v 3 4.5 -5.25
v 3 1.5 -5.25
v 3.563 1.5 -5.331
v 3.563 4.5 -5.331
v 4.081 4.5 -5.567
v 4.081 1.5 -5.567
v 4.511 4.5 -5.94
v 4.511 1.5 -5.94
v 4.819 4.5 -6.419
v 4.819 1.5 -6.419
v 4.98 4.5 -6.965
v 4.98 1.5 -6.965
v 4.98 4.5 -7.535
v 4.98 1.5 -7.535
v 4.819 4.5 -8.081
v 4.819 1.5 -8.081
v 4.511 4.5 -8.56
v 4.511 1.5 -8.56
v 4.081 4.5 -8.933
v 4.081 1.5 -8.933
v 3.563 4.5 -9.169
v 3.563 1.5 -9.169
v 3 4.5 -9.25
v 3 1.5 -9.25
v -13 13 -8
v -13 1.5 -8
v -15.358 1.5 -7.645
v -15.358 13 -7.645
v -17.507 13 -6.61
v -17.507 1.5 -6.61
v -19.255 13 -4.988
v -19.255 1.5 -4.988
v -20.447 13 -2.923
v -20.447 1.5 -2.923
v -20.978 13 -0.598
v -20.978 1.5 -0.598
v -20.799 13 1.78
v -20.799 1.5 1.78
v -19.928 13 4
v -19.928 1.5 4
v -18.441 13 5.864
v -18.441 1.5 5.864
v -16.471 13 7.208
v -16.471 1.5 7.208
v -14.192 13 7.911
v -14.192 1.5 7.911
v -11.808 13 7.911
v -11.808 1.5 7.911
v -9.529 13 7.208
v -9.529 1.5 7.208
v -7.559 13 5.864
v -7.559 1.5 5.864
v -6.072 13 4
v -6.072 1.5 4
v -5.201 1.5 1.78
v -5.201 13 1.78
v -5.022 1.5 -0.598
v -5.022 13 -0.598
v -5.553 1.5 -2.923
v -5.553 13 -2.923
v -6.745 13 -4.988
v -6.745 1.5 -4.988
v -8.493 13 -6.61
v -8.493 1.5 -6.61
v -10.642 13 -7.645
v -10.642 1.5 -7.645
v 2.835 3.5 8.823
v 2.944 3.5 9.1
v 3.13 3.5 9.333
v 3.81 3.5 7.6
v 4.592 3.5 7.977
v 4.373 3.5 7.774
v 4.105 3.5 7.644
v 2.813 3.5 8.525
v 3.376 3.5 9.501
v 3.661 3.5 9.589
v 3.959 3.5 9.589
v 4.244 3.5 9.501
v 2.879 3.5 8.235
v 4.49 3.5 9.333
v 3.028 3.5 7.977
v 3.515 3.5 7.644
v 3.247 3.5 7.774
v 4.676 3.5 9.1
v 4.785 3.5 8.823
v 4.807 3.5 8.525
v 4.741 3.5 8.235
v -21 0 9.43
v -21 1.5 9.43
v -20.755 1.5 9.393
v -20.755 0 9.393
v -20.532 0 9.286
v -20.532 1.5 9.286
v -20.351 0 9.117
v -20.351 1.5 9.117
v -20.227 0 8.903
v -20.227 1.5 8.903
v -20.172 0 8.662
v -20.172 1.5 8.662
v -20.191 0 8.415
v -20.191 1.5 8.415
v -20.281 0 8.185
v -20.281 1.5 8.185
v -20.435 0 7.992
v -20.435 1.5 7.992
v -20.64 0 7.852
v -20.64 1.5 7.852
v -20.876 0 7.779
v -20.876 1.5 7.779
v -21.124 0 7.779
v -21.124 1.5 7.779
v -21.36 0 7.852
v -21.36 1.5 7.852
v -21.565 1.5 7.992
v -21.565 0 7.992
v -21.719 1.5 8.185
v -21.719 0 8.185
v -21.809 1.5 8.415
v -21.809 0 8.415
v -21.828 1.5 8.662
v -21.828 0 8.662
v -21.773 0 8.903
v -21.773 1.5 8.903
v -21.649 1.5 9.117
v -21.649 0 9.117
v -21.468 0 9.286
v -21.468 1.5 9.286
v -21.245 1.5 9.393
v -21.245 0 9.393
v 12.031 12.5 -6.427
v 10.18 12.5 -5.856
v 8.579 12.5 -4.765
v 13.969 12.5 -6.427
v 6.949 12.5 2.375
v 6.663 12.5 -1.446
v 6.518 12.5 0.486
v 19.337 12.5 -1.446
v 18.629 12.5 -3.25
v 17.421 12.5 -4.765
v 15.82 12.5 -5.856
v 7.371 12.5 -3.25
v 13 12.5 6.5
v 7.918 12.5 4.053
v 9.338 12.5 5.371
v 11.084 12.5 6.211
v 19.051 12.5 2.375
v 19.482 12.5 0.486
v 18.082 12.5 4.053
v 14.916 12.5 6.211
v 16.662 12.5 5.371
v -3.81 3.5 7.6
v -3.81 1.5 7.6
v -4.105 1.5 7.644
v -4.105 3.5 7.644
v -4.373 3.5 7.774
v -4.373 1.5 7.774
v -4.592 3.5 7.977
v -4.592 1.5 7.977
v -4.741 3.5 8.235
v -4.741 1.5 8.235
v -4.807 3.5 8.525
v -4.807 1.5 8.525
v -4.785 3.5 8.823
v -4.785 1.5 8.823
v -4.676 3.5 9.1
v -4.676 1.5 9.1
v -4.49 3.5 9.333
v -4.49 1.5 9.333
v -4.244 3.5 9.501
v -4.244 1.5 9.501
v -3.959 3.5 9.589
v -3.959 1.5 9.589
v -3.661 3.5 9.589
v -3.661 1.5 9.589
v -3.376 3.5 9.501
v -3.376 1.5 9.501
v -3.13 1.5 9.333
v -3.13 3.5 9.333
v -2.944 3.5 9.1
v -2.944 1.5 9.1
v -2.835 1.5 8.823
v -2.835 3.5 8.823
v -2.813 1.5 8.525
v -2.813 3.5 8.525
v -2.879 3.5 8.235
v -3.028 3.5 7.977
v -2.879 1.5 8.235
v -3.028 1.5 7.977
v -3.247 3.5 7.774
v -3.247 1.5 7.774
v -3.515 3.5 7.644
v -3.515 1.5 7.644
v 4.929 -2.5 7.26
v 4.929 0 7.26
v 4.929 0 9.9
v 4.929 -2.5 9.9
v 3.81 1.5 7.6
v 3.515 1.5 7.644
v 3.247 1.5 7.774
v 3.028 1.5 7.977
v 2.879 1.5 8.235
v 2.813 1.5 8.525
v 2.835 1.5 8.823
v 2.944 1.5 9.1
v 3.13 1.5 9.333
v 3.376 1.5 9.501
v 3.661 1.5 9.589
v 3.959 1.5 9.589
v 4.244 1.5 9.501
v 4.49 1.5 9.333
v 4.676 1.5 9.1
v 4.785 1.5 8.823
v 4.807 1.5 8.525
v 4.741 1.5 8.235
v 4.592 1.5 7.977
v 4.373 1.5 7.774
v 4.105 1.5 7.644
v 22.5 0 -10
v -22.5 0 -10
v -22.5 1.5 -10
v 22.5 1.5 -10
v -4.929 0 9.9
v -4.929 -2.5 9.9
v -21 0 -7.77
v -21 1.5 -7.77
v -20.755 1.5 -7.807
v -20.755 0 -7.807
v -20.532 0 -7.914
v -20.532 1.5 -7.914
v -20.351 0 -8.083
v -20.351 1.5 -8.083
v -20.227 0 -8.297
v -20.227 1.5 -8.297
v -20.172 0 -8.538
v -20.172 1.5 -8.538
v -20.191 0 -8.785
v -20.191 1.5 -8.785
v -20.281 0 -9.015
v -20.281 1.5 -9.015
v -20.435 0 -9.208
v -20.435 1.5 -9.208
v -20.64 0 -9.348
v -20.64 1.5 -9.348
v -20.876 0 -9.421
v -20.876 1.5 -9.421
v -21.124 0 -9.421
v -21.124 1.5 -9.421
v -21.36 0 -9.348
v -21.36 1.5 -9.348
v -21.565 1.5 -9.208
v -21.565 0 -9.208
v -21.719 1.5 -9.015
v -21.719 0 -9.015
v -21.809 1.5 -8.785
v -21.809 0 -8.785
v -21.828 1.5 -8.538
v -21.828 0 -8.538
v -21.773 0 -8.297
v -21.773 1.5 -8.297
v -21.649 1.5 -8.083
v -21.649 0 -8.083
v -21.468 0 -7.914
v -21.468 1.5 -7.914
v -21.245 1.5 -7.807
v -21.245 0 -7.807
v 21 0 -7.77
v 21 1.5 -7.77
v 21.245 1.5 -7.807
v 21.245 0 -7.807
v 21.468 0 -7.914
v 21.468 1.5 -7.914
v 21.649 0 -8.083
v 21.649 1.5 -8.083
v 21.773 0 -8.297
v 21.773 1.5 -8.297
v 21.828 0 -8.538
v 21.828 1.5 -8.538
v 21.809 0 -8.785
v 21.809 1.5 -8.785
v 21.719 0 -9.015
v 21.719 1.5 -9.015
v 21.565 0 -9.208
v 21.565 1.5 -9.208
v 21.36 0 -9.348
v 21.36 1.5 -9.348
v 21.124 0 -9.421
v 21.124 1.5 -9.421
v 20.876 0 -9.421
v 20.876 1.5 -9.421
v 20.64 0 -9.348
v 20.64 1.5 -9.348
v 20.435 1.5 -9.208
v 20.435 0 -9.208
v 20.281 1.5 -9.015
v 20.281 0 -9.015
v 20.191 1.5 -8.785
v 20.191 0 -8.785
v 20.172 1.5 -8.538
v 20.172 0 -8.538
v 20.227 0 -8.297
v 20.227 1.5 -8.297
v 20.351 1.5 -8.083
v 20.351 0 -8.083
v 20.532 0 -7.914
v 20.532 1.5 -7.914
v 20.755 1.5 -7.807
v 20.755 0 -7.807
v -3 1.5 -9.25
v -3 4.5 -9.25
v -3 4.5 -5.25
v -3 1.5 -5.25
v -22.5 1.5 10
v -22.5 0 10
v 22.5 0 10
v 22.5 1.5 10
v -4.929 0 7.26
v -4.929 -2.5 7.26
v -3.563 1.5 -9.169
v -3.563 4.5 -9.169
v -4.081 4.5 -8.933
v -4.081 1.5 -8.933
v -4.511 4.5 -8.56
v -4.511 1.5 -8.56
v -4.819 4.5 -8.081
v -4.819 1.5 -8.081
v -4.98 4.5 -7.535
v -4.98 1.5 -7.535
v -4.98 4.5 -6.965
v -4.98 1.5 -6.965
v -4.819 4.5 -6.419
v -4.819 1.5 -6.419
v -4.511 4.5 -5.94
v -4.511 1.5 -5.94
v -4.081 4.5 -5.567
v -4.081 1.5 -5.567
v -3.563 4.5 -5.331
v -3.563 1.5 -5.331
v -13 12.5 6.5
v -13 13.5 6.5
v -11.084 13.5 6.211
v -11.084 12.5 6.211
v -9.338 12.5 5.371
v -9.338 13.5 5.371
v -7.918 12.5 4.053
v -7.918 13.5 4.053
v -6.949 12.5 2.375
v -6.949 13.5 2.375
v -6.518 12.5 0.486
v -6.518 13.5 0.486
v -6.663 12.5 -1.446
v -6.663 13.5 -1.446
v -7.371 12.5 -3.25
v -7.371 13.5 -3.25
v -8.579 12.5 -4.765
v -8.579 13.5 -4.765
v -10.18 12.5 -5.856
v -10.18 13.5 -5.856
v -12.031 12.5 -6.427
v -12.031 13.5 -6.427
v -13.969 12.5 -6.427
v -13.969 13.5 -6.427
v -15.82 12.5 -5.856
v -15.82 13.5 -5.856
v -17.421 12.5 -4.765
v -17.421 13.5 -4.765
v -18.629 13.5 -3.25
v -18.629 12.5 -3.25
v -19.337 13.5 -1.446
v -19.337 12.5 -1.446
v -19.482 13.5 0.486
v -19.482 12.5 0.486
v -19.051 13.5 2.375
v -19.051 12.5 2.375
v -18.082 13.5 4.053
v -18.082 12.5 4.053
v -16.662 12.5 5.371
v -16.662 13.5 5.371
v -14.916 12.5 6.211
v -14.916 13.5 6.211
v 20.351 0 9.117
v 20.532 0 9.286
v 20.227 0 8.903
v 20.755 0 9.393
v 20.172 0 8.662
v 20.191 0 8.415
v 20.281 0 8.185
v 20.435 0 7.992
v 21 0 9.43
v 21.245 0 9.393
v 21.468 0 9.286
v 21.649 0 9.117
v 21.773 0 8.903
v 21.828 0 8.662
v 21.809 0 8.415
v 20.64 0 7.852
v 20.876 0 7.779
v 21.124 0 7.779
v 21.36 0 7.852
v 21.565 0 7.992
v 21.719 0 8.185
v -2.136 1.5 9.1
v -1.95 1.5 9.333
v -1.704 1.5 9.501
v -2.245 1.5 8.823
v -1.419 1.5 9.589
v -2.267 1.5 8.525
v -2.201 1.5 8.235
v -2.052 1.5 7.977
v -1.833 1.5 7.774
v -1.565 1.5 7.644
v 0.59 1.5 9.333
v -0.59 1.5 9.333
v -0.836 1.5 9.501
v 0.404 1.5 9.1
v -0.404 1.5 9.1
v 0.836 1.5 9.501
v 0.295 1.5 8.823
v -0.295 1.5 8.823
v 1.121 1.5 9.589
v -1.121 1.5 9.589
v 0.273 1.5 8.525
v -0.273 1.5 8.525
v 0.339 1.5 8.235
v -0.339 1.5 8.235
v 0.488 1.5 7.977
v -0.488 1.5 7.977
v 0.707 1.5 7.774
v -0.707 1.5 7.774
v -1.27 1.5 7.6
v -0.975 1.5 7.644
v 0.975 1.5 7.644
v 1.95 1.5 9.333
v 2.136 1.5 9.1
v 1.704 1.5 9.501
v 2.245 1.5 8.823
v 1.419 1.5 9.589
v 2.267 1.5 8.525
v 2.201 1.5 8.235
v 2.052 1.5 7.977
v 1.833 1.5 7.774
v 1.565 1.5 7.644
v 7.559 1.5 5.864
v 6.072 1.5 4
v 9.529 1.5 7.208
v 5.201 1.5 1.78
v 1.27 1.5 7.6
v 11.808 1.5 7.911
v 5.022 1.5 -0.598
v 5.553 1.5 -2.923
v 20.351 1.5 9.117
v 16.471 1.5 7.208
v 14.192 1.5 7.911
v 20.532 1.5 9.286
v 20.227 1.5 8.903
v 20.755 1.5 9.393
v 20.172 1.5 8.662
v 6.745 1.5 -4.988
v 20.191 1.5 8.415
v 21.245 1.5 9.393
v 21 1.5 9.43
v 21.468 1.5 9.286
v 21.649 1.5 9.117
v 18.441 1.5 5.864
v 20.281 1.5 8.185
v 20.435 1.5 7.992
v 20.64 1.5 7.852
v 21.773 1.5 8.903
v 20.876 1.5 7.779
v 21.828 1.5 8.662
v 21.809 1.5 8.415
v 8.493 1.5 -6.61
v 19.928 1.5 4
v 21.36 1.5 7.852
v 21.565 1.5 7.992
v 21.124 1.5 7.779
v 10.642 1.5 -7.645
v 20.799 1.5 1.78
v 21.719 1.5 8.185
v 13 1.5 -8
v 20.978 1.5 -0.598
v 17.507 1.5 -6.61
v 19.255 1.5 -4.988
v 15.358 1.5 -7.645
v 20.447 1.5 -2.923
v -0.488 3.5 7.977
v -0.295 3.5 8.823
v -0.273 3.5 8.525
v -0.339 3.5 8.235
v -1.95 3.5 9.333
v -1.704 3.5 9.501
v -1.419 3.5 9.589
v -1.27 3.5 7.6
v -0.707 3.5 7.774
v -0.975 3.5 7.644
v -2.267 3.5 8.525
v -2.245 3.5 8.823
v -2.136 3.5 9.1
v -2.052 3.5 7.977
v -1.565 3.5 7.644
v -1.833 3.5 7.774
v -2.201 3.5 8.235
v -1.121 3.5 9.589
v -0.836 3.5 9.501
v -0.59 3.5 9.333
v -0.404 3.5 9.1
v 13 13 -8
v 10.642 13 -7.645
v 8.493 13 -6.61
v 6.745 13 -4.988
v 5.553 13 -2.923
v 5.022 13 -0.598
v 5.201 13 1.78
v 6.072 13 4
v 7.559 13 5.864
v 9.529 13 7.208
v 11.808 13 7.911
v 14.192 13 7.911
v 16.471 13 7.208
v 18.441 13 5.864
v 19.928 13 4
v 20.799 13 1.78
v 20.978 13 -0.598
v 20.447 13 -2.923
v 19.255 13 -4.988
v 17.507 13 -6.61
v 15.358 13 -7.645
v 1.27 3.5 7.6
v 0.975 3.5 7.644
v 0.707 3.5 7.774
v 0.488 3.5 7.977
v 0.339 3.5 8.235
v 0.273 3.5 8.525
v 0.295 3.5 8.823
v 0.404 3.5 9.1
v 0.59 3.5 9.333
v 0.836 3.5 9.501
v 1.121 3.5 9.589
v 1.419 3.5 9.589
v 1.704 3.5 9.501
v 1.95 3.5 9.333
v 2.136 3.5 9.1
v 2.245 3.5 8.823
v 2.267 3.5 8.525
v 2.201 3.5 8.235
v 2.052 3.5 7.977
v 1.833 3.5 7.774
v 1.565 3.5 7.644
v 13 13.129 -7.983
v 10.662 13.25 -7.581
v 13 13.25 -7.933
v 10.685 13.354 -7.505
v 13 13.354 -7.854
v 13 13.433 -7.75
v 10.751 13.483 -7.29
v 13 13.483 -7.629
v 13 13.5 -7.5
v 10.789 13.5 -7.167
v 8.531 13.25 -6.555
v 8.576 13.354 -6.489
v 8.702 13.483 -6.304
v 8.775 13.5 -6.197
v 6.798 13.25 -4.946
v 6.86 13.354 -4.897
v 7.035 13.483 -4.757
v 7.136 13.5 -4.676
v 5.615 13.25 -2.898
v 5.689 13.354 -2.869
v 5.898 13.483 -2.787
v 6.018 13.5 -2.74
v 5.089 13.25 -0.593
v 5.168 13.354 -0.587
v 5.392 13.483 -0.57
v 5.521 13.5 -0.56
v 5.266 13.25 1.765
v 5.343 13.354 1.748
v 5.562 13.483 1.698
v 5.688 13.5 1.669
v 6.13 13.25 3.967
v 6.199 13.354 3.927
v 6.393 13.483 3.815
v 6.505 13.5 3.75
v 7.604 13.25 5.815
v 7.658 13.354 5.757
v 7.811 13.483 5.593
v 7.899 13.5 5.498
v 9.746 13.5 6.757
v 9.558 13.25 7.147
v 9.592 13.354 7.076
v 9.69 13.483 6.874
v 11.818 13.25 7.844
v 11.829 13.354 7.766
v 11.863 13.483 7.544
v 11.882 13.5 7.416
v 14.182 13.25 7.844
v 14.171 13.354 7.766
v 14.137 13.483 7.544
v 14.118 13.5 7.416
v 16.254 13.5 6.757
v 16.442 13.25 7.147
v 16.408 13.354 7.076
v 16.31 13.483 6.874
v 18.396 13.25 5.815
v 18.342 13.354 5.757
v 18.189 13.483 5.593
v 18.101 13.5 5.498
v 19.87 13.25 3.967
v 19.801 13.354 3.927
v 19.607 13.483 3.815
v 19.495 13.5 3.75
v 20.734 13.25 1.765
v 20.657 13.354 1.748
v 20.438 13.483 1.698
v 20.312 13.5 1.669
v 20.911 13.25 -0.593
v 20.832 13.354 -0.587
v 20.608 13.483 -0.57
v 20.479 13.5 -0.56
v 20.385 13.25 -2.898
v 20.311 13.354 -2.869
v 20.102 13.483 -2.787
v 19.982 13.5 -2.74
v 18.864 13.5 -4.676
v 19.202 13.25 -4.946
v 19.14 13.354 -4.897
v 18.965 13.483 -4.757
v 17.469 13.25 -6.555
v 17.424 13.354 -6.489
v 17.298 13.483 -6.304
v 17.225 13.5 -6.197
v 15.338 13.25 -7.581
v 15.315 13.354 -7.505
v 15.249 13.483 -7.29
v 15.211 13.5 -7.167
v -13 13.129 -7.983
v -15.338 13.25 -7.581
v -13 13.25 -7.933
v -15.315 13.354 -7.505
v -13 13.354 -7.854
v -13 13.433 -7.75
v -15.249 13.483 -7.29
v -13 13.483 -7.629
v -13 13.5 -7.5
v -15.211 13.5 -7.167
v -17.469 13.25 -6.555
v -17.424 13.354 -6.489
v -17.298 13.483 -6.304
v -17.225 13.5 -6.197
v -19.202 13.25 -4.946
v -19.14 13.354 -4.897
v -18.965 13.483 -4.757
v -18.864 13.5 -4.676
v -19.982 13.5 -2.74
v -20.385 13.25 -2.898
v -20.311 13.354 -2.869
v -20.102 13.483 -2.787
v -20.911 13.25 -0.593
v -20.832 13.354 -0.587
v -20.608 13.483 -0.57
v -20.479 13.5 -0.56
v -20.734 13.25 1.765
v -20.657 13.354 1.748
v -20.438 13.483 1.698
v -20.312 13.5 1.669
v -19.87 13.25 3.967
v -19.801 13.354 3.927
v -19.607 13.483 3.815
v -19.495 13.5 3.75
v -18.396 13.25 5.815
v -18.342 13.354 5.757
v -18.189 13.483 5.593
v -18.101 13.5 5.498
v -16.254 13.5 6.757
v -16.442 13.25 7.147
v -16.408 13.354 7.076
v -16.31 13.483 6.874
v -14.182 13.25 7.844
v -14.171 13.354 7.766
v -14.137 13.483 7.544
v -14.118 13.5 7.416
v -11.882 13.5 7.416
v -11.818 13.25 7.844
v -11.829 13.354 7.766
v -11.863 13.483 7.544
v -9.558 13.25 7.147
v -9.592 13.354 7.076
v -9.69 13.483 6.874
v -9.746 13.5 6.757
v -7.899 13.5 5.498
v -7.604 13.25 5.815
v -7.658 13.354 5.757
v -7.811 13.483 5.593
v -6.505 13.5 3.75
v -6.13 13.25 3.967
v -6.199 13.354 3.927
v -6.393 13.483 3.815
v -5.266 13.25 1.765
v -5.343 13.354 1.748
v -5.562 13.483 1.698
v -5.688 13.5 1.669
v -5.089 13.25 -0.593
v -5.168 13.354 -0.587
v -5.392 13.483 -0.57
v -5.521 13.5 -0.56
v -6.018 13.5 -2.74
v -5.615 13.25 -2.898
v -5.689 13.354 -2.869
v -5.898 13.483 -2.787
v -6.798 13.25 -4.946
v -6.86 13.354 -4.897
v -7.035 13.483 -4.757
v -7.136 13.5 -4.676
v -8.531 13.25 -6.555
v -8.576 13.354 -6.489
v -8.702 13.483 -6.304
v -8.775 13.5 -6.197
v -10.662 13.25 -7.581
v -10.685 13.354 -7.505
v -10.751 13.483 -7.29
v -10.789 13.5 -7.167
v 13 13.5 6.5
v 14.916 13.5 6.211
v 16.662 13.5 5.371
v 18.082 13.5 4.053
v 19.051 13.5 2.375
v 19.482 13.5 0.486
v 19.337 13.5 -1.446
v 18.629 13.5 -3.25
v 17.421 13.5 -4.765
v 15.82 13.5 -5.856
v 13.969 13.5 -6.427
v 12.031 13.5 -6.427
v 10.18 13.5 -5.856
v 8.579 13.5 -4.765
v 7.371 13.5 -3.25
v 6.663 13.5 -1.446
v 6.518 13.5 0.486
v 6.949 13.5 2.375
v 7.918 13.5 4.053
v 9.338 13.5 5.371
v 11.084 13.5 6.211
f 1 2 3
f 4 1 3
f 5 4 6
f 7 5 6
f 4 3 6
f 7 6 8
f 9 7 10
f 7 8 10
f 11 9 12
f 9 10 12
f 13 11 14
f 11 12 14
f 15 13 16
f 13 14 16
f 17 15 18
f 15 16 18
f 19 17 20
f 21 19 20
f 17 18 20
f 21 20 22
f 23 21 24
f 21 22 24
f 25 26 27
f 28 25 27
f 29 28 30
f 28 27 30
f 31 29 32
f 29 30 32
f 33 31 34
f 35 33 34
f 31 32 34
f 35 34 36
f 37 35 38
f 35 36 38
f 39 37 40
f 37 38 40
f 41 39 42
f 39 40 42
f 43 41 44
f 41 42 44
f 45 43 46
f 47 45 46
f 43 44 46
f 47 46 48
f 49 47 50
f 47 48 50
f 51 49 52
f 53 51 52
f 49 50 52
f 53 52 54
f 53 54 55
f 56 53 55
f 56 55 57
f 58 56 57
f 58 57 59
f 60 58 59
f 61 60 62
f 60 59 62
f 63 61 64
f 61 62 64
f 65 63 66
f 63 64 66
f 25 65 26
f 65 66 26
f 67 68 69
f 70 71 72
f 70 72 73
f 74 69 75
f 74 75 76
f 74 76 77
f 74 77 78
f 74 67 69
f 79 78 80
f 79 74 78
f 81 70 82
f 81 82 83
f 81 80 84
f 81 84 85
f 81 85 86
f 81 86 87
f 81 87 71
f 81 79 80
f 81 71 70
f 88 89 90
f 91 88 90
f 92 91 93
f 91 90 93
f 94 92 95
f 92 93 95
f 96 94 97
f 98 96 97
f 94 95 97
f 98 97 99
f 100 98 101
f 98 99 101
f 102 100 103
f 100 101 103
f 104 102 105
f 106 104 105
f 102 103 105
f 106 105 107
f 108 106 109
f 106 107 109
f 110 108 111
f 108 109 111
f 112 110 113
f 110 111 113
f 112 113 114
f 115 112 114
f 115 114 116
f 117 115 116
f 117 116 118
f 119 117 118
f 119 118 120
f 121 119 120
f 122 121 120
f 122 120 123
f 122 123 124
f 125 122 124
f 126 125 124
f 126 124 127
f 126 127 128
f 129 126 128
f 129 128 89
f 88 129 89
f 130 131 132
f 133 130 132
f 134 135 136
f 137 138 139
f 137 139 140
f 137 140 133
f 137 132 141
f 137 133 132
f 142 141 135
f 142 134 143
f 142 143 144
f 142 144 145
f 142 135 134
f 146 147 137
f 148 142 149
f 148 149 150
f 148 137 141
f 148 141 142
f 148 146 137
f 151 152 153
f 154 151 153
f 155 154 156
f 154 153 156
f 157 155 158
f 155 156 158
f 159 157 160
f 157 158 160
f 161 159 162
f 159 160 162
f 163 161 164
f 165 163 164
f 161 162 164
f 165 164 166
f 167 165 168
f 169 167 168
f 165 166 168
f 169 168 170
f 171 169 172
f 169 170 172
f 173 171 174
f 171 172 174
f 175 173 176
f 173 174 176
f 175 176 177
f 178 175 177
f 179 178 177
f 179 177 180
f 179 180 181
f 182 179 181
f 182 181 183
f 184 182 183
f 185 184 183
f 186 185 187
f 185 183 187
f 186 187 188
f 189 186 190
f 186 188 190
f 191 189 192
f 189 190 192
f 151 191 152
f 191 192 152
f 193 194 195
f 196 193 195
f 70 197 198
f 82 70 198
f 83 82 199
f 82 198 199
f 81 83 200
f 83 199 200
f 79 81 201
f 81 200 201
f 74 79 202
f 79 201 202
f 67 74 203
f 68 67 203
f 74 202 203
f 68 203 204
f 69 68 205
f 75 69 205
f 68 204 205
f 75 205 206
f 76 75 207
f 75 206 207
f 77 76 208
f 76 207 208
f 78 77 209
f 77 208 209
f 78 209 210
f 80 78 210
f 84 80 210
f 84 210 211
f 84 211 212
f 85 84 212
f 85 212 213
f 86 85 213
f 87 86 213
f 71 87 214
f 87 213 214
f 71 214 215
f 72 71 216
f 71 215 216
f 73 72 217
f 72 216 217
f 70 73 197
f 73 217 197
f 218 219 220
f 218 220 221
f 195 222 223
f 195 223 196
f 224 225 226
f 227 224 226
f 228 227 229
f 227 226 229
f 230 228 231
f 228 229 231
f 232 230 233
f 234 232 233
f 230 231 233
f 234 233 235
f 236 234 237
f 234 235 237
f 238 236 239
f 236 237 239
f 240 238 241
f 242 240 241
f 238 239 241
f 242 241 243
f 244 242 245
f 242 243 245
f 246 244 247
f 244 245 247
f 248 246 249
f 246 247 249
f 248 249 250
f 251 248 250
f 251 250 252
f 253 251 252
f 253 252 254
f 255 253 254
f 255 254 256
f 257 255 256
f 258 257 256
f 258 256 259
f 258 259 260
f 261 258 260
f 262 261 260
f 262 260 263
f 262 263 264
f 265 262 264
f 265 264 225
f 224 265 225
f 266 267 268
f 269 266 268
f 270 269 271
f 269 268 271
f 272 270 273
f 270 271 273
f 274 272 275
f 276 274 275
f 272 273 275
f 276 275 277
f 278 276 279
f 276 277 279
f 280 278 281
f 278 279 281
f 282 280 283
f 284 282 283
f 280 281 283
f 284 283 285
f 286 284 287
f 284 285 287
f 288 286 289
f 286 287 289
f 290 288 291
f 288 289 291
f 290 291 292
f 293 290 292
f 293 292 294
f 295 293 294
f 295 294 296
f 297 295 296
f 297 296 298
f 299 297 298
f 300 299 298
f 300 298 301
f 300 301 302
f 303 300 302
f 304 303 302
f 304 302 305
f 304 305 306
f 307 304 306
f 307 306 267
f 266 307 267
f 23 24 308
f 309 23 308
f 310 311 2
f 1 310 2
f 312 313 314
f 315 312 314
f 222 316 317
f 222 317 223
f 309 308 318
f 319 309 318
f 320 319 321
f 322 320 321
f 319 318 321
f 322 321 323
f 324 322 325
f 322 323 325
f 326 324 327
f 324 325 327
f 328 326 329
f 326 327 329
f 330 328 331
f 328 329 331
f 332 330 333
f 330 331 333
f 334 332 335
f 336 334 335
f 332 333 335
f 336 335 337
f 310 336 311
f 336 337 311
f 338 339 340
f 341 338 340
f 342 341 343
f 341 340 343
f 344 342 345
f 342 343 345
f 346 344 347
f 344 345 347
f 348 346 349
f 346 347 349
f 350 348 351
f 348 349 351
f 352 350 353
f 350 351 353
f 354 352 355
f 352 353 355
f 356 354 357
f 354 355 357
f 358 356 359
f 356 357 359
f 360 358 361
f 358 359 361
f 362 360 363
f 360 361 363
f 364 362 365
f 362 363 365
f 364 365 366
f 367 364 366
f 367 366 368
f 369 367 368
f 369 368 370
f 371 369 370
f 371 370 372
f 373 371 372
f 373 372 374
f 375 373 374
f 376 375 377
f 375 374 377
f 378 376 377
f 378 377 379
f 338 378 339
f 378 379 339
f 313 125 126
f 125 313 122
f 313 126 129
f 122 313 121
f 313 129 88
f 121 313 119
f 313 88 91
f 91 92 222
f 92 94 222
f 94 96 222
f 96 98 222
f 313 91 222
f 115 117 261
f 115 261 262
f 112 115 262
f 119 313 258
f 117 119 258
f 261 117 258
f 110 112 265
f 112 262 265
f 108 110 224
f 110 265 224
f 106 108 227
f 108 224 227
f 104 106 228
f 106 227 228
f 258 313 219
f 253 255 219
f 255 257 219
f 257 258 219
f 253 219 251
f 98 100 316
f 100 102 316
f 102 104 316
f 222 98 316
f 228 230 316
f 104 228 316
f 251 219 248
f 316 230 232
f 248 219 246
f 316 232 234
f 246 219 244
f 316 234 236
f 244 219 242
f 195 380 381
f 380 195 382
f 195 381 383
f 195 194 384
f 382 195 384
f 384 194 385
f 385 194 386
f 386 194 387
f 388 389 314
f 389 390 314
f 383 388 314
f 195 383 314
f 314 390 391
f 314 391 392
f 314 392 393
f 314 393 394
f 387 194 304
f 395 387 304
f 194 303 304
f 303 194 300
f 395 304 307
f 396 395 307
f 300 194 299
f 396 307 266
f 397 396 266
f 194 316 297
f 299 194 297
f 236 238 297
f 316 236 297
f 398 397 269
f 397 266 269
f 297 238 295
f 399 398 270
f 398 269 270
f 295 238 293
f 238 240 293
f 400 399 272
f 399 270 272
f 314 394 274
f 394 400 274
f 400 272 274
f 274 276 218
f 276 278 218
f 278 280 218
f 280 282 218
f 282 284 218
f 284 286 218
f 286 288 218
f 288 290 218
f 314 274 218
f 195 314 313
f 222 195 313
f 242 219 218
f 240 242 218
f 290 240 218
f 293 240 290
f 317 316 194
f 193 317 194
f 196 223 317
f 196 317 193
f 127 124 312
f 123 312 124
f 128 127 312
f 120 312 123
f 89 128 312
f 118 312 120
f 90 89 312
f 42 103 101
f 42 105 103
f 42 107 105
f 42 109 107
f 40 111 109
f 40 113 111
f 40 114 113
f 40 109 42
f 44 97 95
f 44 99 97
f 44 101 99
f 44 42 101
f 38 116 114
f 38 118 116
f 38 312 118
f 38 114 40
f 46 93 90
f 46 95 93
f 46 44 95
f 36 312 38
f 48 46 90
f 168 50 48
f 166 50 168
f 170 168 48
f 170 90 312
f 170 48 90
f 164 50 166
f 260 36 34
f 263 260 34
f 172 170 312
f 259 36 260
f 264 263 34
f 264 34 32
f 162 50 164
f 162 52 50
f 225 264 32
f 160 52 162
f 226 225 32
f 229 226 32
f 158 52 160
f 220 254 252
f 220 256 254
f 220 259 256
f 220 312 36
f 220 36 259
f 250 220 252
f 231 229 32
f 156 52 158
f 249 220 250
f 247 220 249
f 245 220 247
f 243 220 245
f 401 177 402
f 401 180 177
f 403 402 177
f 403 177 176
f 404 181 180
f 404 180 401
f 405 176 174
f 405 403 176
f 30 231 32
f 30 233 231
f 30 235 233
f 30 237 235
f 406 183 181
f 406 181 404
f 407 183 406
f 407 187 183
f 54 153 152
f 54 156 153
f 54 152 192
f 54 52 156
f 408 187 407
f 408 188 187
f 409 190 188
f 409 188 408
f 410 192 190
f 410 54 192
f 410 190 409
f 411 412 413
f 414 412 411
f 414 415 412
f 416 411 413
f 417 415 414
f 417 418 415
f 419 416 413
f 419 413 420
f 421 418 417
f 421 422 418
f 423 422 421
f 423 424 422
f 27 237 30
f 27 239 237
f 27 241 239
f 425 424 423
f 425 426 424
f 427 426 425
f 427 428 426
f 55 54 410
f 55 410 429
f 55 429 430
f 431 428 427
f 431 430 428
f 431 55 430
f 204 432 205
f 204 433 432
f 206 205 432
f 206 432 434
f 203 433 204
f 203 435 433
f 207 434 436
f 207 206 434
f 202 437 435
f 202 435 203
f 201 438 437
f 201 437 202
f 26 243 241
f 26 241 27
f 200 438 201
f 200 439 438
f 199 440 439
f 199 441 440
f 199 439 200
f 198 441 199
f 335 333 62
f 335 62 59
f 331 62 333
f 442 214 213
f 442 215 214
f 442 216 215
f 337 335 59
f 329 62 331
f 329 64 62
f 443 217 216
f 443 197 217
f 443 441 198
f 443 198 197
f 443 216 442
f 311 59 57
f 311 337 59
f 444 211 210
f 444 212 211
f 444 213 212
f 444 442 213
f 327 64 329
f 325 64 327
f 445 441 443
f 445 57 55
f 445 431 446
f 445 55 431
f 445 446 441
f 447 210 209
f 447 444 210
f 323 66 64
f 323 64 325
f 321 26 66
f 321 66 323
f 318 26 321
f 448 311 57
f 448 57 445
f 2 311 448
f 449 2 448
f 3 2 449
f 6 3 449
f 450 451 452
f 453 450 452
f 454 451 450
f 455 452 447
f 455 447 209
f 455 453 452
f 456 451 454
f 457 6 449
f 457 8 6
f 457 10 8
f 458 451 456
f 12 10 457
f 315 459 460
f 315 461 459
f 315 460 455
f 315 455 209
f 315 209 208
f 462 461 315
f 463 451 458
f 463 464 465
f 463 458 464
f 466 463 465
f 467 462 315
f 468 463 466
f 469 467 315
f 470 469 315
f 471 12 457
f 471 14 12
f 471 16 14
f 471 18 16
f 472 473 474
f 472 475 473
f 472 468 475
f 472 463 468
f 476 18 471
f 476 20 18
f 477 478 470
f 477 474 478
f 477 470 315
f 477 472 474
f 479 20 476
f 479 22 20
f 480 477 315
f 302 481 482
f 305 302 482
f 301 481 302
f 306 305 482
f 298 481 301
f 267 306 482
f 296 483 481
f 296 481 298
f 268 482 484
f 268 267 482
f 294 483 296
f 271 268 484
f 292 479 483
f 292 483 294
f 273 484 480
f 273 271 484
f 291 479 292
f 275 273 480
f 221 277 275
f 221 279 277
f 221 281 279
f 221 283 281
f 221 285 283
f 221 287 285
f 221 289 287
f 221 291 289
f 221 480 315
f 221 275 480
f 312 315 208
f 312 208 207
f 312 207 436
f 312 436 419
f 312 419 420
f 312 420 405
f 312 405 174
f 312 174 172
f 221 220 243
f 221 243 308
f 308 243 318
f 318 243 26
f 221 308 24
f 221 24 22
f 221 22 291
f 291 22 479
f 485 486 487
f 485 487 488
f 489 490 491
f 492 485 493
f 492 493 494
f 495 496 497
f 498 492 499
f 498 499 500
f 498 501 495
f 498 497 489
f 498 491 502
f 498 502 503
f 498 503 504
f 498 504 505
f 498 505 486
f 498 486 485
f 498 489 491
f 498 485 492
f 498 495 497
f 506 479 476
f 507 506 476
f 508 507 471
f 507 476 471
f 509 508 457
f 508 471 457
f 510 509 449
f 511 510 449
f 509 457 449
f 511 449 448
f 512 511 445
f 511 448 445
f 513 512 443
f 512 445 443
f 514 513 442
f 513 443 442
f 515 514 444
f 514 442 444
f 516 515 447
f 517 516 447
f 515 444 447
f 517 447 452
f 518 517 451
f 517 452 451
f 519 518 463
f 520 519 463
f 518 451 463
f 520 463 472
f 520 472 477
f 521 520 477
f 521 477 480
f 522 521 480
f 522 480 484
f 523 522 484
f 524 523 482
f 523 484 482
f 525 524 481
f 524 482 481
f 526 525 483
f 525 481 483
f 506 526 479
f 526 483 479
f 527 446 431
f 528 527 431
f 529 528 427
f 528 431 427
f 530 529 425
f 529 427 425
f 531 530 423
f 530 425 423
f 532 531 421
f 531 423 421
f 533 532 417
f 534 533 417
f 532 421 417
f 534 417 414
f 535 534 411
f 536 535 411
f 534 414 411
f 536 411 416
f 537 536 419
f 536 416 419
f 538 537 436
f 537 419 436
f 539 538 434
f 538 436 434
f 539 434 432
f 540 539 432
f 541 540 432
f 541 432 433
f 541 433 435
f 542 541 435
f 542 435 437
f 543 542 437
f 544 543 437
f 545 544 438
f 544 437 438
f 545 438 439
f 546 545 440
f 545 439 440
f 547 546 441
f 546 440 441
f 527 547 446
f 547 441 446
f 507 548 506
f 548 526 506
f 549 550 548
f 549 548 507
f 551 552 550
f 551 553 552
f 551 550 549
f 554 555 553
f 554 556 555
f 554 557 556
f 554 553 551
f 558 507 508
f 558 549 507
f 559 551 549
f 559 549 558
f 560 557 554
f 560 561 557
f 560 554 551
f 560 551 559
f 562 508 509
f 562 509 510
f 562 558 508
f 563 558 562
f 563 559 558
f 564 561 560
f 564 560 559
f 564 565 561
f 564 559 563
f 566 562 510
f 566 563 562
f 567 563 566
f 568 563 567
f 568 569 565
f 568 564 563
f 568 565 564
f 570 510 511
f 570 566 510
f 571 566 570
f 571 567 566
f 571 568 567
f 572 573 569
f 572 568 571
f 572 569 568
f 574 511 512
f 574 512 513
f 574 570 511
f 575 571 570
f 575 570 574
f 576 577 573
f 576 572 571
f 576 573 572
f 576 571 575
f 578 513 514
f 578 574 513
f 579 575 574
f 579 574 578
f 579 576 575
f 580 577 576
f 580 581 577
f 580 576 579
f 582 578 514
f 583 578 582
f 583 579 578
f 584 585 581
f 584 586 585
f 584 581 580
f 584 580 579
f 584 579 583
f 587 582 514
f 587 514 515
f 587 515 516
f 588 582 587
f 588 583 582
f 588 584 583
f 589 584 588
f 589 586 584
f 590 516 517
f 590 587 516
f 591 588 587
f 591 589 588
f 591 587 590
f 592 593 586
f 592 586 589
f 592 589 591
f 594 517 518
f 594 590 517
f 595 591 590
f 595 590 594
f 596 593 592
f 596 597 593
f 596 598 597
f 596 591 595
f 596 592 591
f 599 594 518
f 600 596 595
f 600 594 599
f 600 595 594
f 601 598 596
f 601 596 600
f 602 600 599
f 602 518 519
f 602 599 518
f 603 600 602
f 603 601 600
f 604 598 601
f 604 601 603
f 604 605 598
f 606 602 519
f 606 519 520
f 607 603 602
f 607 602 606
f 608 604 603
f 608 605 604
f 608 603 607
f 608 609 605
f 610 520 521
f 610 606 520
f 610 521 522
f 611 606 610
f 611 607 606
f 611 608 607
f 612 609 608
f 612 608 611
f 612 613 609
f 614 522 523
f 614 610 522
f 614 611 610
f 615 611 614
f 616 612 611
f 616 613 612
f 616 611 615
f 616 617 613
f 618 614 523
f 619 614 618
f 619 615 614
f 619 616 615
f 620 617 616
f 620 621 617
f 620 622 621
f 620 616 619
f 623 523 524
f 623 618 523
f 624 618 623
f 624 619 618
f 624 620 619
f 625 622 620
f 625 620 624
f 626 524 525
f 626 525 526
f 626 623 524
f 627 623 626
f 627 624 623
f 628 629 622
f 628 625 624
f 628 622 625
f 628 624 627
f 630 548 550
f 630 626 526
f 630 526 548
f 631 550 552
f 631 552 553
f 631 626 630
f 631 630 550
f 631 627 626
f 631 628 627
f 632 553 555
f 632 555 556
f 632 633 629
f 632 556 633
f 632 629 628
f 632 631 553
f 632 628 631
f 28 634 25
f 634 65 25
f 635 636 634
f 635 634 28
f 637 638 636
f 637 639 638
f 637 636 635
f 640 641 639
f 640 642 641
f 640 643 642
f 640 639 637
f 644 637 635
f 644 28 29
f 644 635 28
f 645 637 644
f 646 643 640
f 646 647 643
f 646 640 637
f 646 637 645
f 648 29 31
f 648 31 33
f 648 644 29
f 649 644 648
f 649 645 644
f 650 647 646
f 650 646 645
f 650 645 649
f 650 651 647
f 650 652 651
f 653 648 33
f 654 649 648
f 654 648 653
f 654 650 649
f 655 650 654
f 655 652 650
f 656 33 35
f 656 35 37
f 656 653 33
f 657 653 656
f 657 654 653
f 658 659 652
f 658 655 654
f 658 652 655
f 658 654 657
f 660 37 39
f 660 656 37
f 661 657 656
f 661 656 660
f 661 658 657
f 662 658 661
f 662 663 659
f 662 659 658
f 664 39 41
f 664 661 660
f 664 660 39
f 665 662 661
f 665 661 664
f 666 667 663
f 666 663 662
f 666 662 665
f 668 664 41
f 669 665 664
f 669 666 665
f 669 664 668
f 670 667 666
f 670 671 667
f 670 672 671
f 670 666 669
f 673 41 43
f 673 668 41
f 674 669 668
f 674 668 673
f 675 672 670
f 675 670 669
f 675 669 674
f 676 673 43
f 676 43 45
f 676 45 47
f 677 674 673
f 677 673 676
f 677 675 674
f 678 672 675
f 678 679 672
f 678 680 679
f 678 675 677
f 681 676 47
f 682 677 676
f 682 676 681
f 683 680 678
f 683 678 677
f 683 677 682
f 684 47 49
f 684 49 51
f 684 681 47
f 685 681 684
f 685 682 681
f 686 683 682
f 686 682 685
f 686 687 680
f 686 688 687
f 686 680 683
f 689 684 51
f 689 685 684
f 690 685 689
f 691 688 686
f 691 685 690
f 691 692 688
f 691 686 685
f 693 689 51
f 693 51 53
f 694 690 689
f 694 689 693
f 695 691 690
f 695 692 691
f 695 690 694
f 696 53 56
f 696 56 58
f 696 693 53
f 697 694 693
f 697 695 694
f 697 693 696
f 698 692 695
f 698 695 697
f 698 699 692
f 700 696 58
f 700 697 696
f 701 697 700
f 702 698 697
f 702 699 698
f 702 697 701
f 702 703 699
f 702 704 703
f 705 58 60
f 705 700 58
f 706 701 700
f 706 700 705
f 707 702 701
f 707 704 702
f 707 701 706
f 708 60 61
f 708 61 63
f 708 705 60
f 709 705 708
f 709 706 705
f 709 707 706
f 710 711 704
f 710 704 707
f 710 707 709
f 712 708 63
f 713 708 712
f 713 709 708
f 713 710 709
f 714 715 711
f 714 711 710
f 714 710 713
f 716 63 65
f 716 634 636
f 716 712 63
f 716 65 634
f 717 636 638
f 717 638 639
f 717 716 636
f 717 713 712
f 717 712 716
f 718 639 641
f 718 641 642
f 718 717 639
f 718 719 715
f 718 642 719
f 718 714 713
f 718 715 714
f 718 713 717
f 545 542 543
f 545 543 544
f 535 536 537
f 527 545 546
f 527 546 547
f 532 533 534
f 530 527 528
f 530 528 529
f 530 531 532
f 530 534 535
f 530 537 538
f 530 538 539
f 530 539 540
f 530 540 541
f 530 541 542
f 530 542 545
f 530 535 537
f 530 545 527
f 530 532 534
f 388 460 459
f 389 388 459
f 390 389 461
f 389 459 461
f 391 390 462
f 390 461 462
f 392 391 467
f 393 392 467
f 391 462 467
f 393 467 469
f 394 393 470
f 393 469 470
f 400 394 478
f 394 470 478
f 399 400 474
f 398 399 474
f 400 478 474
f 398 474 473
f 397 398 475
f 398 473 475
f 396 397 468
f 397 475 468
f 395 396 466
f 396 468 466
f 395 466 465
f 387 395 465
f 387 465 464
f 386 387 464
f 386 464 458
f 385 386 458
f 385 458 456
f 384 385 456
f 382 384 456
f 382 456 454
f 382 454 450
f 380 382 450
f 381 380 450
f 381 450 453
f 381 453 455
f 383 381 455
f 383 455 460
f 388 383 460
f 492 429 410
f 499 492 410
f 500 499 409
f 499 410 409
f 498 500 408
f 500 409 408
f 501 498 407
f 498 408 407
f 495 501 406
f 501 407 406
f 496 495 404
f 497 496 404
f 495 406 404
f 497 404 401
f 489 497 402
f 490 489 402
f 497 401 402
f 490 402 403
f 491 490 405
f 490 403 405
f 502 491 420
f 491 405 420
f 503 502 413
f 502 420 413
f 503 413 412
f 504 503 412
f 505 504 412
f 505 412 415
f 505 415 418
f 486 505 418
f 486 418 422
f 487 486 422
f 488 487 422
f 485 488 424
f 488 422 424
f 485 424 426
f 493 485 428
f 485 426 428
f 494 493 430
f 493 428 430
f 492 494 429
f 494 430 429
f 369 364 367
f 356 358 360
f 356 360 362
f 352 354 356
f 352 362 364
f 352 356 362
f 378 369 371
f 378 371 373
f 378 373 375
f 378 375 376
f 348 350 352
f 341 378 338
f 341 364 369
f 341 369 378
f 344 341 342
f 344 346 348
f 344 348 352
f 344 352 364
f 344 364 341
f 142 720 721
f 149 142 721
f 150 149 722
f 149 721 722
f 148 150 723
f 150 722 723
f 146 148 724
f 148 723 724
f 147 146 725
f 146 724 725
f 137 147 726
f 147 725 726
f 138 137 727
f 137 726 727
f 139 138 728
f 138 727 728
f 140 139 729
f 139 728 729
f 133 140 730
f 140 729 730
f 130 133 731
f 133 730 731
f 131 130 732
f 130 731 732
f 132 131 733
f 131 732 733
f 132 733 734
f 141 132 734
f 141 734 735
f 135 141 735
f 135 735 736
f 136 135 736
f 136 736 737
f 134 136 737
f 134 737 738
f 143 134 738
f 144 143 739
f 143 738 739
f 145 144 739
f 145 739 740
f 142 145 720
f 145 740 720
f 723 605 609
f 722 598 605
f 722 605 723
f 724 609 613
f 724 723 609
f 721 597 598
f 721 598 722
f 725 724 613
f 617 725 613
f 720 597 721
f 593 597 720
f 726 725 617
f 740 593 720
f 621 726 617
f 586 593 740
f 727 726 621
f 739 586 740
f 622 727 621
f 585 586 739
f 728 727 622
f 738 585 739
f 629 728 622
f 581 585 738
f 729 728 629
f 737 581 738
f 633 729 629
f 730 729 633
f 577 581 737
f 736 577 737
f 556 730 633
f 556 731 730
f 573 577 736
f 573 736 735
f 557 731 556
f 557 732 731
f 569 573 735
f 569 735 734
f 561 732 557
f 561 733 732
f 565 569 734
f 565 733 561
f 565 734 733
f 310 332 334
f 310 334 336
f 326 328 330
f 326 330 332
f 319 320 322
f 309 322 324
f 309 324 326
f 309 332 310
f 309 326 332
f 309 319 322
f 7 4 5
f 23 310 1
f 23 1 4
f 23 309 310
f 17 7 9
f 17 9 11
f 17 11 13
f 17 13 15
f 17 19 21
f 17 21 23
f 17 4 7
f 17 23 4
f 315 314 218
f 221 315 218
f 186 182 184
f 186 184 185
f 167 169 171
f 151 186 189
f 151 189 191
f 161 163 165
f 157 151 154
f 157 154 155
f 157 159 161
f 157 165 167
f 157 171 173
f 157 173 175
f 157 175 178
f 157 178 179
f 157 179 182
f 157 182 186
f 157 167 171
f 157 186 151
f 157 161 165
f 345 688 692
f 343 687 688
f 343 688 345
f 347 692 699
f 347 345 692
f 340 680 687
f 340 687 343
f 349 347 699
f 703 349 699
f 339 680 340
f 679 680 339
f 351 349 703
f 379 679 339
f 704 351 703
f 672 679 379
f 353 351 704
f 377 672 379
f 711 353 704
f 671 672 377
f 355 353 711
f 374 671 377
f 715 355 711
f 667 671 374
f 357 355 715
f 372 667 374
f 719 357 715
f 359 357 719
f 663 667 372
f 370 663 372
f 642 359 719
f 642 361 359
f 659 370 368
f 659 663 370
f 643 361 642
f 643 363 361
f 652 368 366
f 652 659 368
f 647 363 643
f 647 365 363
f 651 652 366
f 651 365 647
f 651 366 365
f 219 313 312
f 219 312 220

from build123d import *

# Parameters (mm, degrees)
SKETCH1_W           = 45
SKETCH1_H           = 20
BOSS_EXTRUDE1_DEPTH = 1.5
BOSS_EXTRUDE2_DEPTH = 3
SKETCH4_R           = 8
BOSS_EXTRUDE3_DEPTH = 12
SKETCH5_R           = 6.5
CUT_EXTRUDE1_DEPTH  = 1
SKETCH6_R           = 1
BOSS_EXTRUDE4_DEPTH = 2
FILLET1_R           = 0.5
CUT_EXTRUDE2_REACH  = 29.391
SKETCH3_R           = 0.83
SKETCH7_W           = 9.858526848
SKETCH7_H           = 2.639541059
BOSS_EXTRUDE5_DEPTH = 2.5


with BuildPart() as part:
    # Sketch1 → Boss-Extrude1 (new body)
    with BuildSketch(Plane(origin=(0, 0, 0), x_dir=(1, 0, 0), z_dir=(0, 1, 0))):
        Rectangle(SKETCH1_W, SKETCH1_H)
    extrude(amount=BOSS_EXTRUDE1_DEPTH)

    # Sketch2 → Boss-Extrude2 (add)
    with BuildSketch(Plane(origin=(0, 1.5, 0), x_dir=(1, 0, 0), z_dir=(0, 1, 0))):
        with BuildLine():
            Line((-3, 5.25), (3, 5.25))
            ThreePointArc((3, 5.25), (5, 7.25), (3, 9.25))
            Line((3, 9.25), (-3, 9.25))
            ThreePointArc((-3, 9.25), (-5, 7.25), (-3, 5.25))
        make_face()
    extrude(amount=BOSS_EXTRUDE2_DEPTH)

    # Sketch4 → Boss-Extrude3 (add)
    with BuildSketch(Plane(origin=(0, 1.5, 0), x_dir=(1, 0, 0), z_dir=(0, 1, 0))):
        with Locations(Location((-13, 0, 0), (0, 0, 90))):
            Circle(SKETCH4_R)
        with Locations(Location((13, 0, 0), (0, 0, 90))):
            Circle(SKETCH4_R)
    extrude(amount=BOSS_EXTRUDE3_DEPTH)

    # Sketch5 → Cut-Extrude1 (cut)
    with BuildSketch(Plane(origin=(0, 13.5, 0), x_dir=(1, 0, 0), z_dir=(0, 1, 0))):
        with Locations(Location((-13, 0, 0), (0, 0, 270))):
            Circle(SKETCH5_R)
        with Locations(Location((13, 0, 0), (0, 0, 270))):
            Circle(SKETCH5_R)
    extrude(amount=-CUT_EXTRUDE1_DEPTH, mode=Mode.SUBTRACT)

    # Sketch6 → Boss-Extrude4 (add)
    with BuildSketch(Plane(origin=(0, 1.5, 0), x_dir=(1, 0, 0), z_dir=(0, 1, 0))):
        with Locations(Location((-3.81, -8.6, 0), (0, 0, 90))):
            Circle(SKETCH6_R)
        with Locations(Location((-1.27, -8.6, 0), (0, 0, 90))):
            Circle(SKETCH6_R)
        with Locations(Location((1.27, -8.6, 0), (0, 0, 90))):
            Circle(SKETCH6_R)
        with Locations(Location((3.81, -8.6, 0), (0, 0, 90))):
            Circle(SKETCH6_R)
    extrude(amount=BOSS_EXTRUDE4_DEPTH)

    # Fillet1
    fillet1_edges = [part.edges().sort_by_distance(p)[0] for p in [
        (-13, 13.5, 8),
        (13, 13.5, 8),
    ]]
    fillet(fillet1_edges, radius=FILLET1_R)

    # Sketch3 → Cut-Extrude2 (cut, up to next)
    with BuildSketch(Plane(origin=(0, 1.5, 0), x_dir=(1, 0, 0), z_dir=(0, 1, 0)), mode=Mode.PRIVATE) as cut_extrude2_sk1:
        with Locations(Location((-21, 8.6, 0), (0, 0, 270))):
            Circle(SKETCH3_R)
    cut_extrude2_tool1 = extrude(cut_extrude2_sk1.sketch, amount=-CUT_EXTRUDE2_REACH, mode=Mode.PRIVATE) & part.part
    # Sketch3 → Cut-Extrude2 (cut, up to next)
    with BuildSketch(Plane(origin=(0, 1.5, 0), x_dir=(1, 0, 0), z_dir=(0, 1, 0)), mode=Mode.PRIVATE) as cut_extrude2_sk2:
        with Locations(Location((-21, -8.6, 0), (0, 0, 270))):
            Circle(SKETCH3_R)
    cut_extrude2_tool2 = extrude(cut_extrude2_sk2.sketch, amount=-CUT_EXTRUDE2_REACH, mode=Mode.PRIVATE) & part.part
    # Sketch3 → Cut-Extrude2 (cut, up to next)
    with BuildSketch(Plane(origin=(0, 1.5, 0), x_dir=(1, 0, 0), z_dir=(0, 1, 0)), mode=Mode.PRIVATE) as cut_extrude2_sk3:
        with Locations(Location((21, -8.6, 0), (0, 0, 270))):
            Circle(SKETCH3_R)
    cut_extrude2_tool3 = extrude(cut_extrude2_sk3.sketch, amount=-CUT_EXTRUDE2_REACH, mode=Mode.PRIVATE) & part.part
    # Sketch3 → Cut-Extrude2 (cut, up to next)
    with BuildSketch(Plane(origin=(0, 1.5, 0), x_dir=(1, 0, 0), z_dir=(0, 1, 0)), mode=Mode.PRIVATE) as cut_extrude2_sk4:
        with Locations(Location((21, 8.6, 0), (0, 0, 270))):
            Circle(SKETCH3_R)
    cut_extrude2_tool4 = extrude(cut_extrude2_sk4.sketch, amount=-CUT_EXTRUDE2_REACH, mode=Mode.PRIVATE) & part.part
    add(cut_extrude2_tool1.solids().sort_by_distance((-21, 1.5, -8.6))[0], mode=Mode.SUBTRACT)
    add(cut_extrude2_tool2.solids().sort_by_distance((-21, 1.5, 8.6))[0], mode=Mode.SUBTRACT)
    add(cut_extrude2_tool3.solids().sort_by_distance((21, 1.5, 8.6))[0], mode=Mode.SUBTRACT)
    add(cut_extrude2_tool4.solids().sort_by_distance((21, 1.5, -8.6))[0], mode=Mode.SUBTRACT)

    # Sketch7 → Boss-Extrude5 (add)
    with BuildSketch(Plane.XZ):
        with Locations((0, 8.580229471)):
            Rectangle(SKETCH7_W, SKETCH7_H)
    extrude(amount=BOSS_EXTRUDE5_DEPTH)


solid = part.part
